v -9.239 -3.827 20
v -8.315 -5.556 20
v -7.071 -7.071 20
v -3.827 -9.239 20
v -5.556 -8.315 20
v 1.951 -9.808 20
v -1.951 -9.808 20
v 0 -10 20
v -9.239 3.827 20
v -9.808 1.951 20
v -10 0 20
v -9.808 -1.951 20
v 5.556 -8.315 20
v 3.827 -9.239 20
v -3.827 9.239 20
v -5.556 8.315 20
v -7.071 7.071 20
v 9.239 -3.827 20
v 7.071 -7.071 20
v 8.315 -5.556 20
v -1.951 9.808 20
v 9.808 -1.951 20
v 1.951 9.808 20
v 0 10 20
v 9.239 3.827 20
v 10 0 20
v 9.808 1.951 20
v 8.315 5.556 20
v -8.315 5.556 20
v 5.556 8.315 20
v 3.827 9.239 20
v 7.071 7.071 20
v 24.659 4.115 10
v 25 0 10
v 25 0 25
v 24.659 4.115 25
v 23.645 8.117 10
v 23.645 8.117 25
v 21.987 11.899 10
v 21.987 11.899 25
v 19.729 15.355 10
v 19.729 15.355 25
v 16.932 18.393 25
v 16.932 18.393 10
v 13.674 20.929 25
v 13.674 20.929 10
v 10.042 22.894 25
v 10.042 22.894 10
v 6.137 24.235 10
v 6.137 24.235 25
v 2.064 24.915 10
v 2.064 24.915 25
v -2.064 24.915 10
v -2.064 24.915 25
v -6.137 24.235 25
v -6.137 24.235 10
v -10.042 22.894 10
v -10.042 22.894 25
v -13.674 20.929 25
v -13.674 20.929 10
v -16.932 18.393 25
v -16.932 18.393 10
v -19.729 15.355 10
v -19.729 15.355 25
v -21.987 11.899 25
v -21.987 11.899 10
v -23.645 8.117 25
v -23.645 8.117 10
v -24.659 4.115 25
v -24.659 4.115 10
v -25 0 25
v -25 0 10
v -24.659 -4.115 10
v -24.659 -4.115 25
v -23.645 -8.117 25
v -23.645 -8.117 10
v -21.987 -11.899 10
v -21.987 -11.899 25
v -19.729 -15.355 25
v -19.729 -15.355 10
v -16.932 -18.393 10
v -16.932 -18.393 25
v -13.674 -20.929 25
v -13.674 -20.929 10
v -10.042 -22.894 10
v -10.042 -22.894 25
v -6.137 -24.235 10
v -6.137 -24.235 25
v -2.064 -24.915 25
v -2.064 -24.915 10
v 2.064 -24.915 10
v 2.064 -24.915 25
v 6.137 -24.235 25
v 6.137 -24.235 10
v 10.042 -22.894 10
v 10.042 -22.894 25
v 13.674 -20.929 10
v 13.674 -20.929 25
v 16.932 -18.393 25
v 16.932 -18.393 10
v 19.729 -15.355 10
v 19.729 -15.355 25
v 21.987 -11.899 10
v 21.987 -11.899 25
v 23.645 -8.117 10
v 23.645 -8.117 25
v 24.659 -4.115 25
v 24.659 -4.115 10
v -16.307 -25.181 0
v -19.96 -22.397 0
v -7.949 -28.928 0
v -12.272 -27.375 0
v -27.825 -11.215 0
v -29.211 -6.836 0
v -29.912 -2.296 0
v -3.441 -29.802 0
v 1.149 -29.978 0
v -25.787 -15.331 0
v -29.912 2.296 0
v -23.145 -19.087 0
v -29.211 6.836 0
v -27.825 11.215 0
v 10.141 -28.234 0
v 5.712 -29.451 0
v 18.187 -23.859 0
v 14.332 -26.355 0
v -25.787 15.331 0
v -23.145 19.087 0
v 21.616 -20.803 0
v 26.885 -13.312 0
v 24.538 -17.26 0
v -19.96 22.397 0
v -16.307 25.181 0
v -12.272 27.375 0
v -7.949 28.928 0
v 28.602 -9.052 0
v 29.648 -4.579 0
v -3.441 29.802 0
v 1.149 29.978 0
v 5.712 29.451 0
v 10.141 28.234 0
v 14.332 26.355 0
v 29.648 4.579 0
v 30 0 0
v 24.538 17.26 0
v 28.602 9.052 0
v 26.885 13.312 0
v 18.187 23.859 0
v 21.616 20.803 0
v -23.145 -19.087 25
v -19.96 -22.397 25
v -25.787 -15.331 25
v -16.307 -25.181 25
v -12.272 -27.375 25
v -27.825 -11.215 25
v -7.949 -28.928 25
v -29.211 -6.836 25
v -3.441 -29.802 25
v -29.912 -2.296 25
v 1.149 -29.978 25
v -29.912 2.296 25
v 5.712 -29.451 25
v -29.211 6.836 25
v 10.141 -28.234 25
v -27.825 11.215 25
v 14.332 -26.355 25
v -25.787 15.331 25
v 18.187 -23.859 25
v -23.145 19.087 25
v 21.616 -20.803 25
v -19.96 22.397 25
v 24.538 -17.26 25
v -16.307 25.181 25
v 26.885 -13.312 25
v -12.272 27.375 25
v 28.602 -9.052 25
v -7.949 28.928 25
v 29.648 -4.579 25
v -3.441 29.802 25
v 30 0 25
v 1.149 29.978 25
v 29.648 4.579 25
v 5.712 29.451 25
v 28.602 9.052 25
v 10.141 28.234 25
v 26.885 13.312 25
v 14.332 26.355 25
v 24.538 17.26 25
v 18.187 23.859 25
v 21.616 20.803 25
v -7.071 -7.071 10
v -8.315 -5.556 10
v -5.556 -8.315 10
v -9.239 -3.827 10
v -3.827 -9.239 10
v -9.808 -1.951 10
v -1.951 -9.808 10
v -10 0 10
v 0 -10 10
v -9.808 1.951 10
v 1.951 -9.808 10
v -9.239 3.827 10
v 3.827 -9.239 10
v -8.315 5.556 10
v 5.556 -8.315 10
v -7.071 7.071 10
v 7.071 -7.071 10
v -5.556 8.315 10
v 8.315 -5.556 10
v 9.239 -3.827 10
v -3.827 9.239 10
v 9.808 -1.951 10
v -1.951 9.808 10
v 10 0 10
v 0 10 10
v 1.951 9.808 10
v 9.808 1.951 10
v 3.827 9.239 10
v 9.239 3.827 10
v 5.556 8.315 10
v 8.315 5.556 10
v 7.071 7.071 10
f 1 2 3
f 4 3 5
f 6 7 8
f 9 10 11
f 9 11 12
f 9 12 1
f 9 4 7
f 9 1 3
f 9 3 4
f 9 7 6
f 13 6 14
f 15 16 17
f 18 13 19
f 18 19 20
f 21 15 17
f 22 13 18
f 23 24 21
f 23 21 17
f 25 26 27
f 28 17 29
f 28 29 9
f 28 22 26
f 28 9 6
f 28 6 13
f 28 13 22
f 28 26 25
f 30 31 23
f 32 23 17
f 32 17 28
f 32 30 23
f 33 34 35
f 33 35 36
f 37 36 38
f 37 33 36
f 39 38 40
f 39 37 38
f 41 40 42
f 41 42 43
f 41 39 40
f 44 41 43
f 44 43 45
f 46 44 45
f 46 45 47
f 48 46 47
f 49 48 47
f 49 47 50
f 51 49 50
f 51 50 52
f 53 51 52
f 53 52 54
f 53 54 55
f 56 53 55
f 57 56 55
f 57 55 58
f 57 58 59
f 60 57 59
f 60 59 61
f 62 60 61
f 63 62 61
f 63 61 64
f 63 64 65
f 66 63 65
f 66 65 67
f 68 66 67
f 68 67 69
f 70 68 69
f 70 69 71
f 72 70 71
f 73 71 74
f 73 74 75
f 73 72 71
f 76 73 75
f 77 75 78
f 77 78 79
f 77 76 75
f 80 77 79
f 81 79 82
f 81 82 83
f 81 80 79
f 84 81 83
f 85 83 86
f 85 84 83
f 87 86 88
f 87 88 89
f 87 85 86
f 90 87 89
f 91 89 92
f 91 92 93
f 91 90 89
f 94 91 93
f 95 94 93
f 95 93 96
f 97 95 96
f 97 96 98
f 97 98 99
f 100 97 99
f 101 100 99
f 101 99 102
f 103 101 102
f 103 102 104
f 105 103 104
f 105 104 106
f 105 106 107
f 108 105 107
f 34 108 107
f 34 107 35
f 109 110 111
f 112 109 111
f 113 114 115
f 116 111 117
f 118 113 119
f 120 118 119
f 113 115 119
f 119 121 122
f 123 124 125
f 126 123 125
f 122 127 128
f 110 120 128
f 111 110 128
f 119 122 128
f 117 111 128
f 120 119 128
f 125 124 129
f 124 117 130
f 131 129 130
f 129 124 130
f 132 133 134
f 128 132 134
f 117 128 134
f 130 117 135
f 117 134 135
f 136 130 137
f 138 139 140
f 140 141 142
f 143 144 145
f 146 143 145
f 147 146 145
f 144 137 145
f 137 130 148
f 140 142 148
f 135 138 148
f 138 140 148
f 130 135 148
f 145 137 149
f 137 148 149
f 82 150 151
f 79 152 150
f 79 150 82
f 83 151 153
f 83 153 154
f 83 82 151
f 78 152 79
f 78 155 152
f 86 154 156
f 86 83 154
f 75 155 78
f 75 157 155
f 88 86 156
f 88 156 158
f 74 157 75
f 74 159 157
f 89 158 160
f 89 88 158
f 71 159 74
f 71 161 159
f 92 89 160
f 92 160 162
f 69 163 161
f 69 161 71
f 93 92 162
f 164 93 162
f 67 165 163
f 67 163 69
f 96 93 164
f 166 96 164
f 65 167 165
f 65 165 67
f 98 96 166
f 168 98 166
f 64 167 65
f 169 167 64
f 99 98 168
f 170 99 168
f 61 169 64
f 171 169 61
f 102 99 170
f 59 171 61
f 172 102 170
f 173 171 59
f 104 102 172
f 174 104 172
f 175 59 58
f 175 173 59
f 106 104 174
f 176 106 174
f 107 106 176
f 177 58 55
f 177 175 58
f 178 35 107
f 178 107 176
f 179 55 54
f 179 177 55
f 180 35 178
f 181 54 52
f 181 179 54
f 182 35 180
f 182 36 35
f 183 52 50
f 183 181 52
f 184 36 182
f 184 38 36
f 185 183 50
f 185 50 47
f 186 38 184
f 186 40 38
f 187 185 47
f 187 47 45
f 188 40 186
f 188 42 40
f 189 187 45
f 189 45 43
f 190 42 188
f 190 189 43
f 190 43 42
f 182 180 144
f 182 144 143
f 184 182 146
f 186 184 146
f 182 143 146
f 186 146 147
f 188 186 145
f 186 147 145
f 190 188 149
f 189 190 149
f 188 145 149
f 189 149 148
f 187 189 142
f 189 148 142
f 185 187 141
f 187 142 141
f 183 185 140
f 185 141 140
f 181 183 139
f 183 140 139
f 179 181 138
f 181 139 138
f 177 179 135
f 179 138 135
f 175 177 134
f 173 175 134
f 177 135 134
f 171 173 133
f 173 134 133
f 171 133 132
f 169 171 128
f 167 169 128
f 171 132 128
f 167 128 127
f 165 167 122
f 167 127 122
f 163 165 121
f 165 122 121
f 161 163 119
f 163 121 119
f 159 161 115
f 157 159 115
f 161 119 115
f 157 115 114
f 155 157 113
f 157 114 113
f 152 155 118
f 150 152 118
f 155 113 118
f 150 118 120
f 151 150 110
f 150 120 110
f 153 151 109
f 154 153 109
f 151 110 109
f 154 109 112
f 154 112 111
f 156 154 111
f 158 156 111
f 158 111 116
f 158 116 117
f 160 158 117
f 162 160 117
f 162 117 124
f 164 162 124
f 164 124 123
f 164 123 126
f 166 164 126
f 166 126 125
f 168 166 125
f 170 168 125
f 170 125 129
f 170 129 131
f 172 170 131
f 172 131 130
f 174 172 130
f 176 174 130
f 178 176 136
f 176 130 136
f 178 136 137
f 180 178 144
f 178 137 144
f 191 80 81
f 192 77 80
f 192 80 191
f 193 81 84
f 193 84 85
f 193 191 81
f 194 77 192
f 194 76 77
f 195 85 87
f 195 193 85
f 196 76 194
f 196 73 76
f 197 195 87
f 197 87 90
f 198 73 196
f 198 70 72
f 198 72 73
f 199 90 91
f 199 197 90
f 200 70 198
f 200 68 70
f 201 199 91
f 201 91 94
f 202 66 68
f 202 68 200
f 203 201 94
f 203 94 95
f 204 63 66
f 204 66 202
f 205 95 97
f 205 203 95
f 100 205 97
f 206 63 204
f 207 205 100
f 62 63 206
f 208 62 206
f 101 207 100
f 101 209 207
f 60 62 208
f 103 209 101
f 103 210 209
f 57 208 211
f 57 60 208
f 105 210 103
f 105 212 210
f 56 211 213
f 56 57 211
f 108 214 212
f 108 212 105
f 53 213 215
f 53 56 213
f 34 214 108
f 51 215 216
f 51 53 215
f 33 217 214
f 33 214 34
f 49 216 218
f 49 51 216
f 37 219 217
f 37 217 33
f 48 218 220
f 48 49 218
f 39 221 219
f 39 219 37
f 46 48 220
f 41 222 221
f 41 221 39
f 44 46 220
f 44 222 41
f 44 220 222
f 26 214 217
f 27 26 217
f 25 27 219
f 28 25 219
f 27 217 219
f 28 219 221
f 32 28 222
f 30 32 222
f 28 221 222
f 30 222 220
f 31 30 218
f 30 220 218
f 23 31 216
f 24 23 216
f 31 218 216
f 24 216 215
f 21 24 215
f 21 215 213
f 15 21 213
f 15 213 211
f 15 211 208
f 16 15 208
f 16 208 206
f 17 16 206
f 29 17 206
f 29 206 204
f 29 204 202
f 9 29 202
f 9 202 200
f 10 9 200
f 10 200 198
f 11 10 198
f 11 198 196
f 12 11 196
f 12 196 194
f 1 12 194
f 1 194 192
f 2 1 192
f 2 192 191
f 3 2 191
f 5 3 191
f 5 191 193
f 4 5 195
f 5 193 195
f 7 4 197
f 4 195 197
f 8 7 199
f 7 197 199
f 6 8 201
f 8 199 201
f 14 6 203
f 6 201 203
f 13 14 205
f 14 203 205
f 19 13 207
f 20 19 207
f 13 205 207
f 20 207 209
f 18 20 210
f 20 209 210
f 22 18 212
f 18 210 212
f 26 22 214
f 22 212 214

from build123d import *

# Parameters (mm, degrees)
F0_R     = 30
F0_R_2   = 25
F1_DEPTH = 25
F2_R     = 25
F2_R_2   = 10
F3_DEPTH = 10
F4_DEPTH = 20


with BuildPart() as f1:
    # F0 (on Top) → F1 (new body)
    with BuildSketch(Plane.XY):
        Circle(F0_R)
        Circle(F0_R_2, mode=Mode.SUBTRACT)
    extrude(amount=F1_DEPTH)

    # F2 (on Top) → F3 (join)
    with BuildSketch(Plane.XY):
        Circle(F2_R)
        Circle(F2_R_2, mode=Mode.SUBTRACT)
    extrude(amount=F3_DEPTH)

    # F2 (on Top) → F4 (join)
    with BuildSketch(Plane.XY):
        Circle(F2_R_2)
    extrude(amount=F4_DEPTH)


solid = f1.part
